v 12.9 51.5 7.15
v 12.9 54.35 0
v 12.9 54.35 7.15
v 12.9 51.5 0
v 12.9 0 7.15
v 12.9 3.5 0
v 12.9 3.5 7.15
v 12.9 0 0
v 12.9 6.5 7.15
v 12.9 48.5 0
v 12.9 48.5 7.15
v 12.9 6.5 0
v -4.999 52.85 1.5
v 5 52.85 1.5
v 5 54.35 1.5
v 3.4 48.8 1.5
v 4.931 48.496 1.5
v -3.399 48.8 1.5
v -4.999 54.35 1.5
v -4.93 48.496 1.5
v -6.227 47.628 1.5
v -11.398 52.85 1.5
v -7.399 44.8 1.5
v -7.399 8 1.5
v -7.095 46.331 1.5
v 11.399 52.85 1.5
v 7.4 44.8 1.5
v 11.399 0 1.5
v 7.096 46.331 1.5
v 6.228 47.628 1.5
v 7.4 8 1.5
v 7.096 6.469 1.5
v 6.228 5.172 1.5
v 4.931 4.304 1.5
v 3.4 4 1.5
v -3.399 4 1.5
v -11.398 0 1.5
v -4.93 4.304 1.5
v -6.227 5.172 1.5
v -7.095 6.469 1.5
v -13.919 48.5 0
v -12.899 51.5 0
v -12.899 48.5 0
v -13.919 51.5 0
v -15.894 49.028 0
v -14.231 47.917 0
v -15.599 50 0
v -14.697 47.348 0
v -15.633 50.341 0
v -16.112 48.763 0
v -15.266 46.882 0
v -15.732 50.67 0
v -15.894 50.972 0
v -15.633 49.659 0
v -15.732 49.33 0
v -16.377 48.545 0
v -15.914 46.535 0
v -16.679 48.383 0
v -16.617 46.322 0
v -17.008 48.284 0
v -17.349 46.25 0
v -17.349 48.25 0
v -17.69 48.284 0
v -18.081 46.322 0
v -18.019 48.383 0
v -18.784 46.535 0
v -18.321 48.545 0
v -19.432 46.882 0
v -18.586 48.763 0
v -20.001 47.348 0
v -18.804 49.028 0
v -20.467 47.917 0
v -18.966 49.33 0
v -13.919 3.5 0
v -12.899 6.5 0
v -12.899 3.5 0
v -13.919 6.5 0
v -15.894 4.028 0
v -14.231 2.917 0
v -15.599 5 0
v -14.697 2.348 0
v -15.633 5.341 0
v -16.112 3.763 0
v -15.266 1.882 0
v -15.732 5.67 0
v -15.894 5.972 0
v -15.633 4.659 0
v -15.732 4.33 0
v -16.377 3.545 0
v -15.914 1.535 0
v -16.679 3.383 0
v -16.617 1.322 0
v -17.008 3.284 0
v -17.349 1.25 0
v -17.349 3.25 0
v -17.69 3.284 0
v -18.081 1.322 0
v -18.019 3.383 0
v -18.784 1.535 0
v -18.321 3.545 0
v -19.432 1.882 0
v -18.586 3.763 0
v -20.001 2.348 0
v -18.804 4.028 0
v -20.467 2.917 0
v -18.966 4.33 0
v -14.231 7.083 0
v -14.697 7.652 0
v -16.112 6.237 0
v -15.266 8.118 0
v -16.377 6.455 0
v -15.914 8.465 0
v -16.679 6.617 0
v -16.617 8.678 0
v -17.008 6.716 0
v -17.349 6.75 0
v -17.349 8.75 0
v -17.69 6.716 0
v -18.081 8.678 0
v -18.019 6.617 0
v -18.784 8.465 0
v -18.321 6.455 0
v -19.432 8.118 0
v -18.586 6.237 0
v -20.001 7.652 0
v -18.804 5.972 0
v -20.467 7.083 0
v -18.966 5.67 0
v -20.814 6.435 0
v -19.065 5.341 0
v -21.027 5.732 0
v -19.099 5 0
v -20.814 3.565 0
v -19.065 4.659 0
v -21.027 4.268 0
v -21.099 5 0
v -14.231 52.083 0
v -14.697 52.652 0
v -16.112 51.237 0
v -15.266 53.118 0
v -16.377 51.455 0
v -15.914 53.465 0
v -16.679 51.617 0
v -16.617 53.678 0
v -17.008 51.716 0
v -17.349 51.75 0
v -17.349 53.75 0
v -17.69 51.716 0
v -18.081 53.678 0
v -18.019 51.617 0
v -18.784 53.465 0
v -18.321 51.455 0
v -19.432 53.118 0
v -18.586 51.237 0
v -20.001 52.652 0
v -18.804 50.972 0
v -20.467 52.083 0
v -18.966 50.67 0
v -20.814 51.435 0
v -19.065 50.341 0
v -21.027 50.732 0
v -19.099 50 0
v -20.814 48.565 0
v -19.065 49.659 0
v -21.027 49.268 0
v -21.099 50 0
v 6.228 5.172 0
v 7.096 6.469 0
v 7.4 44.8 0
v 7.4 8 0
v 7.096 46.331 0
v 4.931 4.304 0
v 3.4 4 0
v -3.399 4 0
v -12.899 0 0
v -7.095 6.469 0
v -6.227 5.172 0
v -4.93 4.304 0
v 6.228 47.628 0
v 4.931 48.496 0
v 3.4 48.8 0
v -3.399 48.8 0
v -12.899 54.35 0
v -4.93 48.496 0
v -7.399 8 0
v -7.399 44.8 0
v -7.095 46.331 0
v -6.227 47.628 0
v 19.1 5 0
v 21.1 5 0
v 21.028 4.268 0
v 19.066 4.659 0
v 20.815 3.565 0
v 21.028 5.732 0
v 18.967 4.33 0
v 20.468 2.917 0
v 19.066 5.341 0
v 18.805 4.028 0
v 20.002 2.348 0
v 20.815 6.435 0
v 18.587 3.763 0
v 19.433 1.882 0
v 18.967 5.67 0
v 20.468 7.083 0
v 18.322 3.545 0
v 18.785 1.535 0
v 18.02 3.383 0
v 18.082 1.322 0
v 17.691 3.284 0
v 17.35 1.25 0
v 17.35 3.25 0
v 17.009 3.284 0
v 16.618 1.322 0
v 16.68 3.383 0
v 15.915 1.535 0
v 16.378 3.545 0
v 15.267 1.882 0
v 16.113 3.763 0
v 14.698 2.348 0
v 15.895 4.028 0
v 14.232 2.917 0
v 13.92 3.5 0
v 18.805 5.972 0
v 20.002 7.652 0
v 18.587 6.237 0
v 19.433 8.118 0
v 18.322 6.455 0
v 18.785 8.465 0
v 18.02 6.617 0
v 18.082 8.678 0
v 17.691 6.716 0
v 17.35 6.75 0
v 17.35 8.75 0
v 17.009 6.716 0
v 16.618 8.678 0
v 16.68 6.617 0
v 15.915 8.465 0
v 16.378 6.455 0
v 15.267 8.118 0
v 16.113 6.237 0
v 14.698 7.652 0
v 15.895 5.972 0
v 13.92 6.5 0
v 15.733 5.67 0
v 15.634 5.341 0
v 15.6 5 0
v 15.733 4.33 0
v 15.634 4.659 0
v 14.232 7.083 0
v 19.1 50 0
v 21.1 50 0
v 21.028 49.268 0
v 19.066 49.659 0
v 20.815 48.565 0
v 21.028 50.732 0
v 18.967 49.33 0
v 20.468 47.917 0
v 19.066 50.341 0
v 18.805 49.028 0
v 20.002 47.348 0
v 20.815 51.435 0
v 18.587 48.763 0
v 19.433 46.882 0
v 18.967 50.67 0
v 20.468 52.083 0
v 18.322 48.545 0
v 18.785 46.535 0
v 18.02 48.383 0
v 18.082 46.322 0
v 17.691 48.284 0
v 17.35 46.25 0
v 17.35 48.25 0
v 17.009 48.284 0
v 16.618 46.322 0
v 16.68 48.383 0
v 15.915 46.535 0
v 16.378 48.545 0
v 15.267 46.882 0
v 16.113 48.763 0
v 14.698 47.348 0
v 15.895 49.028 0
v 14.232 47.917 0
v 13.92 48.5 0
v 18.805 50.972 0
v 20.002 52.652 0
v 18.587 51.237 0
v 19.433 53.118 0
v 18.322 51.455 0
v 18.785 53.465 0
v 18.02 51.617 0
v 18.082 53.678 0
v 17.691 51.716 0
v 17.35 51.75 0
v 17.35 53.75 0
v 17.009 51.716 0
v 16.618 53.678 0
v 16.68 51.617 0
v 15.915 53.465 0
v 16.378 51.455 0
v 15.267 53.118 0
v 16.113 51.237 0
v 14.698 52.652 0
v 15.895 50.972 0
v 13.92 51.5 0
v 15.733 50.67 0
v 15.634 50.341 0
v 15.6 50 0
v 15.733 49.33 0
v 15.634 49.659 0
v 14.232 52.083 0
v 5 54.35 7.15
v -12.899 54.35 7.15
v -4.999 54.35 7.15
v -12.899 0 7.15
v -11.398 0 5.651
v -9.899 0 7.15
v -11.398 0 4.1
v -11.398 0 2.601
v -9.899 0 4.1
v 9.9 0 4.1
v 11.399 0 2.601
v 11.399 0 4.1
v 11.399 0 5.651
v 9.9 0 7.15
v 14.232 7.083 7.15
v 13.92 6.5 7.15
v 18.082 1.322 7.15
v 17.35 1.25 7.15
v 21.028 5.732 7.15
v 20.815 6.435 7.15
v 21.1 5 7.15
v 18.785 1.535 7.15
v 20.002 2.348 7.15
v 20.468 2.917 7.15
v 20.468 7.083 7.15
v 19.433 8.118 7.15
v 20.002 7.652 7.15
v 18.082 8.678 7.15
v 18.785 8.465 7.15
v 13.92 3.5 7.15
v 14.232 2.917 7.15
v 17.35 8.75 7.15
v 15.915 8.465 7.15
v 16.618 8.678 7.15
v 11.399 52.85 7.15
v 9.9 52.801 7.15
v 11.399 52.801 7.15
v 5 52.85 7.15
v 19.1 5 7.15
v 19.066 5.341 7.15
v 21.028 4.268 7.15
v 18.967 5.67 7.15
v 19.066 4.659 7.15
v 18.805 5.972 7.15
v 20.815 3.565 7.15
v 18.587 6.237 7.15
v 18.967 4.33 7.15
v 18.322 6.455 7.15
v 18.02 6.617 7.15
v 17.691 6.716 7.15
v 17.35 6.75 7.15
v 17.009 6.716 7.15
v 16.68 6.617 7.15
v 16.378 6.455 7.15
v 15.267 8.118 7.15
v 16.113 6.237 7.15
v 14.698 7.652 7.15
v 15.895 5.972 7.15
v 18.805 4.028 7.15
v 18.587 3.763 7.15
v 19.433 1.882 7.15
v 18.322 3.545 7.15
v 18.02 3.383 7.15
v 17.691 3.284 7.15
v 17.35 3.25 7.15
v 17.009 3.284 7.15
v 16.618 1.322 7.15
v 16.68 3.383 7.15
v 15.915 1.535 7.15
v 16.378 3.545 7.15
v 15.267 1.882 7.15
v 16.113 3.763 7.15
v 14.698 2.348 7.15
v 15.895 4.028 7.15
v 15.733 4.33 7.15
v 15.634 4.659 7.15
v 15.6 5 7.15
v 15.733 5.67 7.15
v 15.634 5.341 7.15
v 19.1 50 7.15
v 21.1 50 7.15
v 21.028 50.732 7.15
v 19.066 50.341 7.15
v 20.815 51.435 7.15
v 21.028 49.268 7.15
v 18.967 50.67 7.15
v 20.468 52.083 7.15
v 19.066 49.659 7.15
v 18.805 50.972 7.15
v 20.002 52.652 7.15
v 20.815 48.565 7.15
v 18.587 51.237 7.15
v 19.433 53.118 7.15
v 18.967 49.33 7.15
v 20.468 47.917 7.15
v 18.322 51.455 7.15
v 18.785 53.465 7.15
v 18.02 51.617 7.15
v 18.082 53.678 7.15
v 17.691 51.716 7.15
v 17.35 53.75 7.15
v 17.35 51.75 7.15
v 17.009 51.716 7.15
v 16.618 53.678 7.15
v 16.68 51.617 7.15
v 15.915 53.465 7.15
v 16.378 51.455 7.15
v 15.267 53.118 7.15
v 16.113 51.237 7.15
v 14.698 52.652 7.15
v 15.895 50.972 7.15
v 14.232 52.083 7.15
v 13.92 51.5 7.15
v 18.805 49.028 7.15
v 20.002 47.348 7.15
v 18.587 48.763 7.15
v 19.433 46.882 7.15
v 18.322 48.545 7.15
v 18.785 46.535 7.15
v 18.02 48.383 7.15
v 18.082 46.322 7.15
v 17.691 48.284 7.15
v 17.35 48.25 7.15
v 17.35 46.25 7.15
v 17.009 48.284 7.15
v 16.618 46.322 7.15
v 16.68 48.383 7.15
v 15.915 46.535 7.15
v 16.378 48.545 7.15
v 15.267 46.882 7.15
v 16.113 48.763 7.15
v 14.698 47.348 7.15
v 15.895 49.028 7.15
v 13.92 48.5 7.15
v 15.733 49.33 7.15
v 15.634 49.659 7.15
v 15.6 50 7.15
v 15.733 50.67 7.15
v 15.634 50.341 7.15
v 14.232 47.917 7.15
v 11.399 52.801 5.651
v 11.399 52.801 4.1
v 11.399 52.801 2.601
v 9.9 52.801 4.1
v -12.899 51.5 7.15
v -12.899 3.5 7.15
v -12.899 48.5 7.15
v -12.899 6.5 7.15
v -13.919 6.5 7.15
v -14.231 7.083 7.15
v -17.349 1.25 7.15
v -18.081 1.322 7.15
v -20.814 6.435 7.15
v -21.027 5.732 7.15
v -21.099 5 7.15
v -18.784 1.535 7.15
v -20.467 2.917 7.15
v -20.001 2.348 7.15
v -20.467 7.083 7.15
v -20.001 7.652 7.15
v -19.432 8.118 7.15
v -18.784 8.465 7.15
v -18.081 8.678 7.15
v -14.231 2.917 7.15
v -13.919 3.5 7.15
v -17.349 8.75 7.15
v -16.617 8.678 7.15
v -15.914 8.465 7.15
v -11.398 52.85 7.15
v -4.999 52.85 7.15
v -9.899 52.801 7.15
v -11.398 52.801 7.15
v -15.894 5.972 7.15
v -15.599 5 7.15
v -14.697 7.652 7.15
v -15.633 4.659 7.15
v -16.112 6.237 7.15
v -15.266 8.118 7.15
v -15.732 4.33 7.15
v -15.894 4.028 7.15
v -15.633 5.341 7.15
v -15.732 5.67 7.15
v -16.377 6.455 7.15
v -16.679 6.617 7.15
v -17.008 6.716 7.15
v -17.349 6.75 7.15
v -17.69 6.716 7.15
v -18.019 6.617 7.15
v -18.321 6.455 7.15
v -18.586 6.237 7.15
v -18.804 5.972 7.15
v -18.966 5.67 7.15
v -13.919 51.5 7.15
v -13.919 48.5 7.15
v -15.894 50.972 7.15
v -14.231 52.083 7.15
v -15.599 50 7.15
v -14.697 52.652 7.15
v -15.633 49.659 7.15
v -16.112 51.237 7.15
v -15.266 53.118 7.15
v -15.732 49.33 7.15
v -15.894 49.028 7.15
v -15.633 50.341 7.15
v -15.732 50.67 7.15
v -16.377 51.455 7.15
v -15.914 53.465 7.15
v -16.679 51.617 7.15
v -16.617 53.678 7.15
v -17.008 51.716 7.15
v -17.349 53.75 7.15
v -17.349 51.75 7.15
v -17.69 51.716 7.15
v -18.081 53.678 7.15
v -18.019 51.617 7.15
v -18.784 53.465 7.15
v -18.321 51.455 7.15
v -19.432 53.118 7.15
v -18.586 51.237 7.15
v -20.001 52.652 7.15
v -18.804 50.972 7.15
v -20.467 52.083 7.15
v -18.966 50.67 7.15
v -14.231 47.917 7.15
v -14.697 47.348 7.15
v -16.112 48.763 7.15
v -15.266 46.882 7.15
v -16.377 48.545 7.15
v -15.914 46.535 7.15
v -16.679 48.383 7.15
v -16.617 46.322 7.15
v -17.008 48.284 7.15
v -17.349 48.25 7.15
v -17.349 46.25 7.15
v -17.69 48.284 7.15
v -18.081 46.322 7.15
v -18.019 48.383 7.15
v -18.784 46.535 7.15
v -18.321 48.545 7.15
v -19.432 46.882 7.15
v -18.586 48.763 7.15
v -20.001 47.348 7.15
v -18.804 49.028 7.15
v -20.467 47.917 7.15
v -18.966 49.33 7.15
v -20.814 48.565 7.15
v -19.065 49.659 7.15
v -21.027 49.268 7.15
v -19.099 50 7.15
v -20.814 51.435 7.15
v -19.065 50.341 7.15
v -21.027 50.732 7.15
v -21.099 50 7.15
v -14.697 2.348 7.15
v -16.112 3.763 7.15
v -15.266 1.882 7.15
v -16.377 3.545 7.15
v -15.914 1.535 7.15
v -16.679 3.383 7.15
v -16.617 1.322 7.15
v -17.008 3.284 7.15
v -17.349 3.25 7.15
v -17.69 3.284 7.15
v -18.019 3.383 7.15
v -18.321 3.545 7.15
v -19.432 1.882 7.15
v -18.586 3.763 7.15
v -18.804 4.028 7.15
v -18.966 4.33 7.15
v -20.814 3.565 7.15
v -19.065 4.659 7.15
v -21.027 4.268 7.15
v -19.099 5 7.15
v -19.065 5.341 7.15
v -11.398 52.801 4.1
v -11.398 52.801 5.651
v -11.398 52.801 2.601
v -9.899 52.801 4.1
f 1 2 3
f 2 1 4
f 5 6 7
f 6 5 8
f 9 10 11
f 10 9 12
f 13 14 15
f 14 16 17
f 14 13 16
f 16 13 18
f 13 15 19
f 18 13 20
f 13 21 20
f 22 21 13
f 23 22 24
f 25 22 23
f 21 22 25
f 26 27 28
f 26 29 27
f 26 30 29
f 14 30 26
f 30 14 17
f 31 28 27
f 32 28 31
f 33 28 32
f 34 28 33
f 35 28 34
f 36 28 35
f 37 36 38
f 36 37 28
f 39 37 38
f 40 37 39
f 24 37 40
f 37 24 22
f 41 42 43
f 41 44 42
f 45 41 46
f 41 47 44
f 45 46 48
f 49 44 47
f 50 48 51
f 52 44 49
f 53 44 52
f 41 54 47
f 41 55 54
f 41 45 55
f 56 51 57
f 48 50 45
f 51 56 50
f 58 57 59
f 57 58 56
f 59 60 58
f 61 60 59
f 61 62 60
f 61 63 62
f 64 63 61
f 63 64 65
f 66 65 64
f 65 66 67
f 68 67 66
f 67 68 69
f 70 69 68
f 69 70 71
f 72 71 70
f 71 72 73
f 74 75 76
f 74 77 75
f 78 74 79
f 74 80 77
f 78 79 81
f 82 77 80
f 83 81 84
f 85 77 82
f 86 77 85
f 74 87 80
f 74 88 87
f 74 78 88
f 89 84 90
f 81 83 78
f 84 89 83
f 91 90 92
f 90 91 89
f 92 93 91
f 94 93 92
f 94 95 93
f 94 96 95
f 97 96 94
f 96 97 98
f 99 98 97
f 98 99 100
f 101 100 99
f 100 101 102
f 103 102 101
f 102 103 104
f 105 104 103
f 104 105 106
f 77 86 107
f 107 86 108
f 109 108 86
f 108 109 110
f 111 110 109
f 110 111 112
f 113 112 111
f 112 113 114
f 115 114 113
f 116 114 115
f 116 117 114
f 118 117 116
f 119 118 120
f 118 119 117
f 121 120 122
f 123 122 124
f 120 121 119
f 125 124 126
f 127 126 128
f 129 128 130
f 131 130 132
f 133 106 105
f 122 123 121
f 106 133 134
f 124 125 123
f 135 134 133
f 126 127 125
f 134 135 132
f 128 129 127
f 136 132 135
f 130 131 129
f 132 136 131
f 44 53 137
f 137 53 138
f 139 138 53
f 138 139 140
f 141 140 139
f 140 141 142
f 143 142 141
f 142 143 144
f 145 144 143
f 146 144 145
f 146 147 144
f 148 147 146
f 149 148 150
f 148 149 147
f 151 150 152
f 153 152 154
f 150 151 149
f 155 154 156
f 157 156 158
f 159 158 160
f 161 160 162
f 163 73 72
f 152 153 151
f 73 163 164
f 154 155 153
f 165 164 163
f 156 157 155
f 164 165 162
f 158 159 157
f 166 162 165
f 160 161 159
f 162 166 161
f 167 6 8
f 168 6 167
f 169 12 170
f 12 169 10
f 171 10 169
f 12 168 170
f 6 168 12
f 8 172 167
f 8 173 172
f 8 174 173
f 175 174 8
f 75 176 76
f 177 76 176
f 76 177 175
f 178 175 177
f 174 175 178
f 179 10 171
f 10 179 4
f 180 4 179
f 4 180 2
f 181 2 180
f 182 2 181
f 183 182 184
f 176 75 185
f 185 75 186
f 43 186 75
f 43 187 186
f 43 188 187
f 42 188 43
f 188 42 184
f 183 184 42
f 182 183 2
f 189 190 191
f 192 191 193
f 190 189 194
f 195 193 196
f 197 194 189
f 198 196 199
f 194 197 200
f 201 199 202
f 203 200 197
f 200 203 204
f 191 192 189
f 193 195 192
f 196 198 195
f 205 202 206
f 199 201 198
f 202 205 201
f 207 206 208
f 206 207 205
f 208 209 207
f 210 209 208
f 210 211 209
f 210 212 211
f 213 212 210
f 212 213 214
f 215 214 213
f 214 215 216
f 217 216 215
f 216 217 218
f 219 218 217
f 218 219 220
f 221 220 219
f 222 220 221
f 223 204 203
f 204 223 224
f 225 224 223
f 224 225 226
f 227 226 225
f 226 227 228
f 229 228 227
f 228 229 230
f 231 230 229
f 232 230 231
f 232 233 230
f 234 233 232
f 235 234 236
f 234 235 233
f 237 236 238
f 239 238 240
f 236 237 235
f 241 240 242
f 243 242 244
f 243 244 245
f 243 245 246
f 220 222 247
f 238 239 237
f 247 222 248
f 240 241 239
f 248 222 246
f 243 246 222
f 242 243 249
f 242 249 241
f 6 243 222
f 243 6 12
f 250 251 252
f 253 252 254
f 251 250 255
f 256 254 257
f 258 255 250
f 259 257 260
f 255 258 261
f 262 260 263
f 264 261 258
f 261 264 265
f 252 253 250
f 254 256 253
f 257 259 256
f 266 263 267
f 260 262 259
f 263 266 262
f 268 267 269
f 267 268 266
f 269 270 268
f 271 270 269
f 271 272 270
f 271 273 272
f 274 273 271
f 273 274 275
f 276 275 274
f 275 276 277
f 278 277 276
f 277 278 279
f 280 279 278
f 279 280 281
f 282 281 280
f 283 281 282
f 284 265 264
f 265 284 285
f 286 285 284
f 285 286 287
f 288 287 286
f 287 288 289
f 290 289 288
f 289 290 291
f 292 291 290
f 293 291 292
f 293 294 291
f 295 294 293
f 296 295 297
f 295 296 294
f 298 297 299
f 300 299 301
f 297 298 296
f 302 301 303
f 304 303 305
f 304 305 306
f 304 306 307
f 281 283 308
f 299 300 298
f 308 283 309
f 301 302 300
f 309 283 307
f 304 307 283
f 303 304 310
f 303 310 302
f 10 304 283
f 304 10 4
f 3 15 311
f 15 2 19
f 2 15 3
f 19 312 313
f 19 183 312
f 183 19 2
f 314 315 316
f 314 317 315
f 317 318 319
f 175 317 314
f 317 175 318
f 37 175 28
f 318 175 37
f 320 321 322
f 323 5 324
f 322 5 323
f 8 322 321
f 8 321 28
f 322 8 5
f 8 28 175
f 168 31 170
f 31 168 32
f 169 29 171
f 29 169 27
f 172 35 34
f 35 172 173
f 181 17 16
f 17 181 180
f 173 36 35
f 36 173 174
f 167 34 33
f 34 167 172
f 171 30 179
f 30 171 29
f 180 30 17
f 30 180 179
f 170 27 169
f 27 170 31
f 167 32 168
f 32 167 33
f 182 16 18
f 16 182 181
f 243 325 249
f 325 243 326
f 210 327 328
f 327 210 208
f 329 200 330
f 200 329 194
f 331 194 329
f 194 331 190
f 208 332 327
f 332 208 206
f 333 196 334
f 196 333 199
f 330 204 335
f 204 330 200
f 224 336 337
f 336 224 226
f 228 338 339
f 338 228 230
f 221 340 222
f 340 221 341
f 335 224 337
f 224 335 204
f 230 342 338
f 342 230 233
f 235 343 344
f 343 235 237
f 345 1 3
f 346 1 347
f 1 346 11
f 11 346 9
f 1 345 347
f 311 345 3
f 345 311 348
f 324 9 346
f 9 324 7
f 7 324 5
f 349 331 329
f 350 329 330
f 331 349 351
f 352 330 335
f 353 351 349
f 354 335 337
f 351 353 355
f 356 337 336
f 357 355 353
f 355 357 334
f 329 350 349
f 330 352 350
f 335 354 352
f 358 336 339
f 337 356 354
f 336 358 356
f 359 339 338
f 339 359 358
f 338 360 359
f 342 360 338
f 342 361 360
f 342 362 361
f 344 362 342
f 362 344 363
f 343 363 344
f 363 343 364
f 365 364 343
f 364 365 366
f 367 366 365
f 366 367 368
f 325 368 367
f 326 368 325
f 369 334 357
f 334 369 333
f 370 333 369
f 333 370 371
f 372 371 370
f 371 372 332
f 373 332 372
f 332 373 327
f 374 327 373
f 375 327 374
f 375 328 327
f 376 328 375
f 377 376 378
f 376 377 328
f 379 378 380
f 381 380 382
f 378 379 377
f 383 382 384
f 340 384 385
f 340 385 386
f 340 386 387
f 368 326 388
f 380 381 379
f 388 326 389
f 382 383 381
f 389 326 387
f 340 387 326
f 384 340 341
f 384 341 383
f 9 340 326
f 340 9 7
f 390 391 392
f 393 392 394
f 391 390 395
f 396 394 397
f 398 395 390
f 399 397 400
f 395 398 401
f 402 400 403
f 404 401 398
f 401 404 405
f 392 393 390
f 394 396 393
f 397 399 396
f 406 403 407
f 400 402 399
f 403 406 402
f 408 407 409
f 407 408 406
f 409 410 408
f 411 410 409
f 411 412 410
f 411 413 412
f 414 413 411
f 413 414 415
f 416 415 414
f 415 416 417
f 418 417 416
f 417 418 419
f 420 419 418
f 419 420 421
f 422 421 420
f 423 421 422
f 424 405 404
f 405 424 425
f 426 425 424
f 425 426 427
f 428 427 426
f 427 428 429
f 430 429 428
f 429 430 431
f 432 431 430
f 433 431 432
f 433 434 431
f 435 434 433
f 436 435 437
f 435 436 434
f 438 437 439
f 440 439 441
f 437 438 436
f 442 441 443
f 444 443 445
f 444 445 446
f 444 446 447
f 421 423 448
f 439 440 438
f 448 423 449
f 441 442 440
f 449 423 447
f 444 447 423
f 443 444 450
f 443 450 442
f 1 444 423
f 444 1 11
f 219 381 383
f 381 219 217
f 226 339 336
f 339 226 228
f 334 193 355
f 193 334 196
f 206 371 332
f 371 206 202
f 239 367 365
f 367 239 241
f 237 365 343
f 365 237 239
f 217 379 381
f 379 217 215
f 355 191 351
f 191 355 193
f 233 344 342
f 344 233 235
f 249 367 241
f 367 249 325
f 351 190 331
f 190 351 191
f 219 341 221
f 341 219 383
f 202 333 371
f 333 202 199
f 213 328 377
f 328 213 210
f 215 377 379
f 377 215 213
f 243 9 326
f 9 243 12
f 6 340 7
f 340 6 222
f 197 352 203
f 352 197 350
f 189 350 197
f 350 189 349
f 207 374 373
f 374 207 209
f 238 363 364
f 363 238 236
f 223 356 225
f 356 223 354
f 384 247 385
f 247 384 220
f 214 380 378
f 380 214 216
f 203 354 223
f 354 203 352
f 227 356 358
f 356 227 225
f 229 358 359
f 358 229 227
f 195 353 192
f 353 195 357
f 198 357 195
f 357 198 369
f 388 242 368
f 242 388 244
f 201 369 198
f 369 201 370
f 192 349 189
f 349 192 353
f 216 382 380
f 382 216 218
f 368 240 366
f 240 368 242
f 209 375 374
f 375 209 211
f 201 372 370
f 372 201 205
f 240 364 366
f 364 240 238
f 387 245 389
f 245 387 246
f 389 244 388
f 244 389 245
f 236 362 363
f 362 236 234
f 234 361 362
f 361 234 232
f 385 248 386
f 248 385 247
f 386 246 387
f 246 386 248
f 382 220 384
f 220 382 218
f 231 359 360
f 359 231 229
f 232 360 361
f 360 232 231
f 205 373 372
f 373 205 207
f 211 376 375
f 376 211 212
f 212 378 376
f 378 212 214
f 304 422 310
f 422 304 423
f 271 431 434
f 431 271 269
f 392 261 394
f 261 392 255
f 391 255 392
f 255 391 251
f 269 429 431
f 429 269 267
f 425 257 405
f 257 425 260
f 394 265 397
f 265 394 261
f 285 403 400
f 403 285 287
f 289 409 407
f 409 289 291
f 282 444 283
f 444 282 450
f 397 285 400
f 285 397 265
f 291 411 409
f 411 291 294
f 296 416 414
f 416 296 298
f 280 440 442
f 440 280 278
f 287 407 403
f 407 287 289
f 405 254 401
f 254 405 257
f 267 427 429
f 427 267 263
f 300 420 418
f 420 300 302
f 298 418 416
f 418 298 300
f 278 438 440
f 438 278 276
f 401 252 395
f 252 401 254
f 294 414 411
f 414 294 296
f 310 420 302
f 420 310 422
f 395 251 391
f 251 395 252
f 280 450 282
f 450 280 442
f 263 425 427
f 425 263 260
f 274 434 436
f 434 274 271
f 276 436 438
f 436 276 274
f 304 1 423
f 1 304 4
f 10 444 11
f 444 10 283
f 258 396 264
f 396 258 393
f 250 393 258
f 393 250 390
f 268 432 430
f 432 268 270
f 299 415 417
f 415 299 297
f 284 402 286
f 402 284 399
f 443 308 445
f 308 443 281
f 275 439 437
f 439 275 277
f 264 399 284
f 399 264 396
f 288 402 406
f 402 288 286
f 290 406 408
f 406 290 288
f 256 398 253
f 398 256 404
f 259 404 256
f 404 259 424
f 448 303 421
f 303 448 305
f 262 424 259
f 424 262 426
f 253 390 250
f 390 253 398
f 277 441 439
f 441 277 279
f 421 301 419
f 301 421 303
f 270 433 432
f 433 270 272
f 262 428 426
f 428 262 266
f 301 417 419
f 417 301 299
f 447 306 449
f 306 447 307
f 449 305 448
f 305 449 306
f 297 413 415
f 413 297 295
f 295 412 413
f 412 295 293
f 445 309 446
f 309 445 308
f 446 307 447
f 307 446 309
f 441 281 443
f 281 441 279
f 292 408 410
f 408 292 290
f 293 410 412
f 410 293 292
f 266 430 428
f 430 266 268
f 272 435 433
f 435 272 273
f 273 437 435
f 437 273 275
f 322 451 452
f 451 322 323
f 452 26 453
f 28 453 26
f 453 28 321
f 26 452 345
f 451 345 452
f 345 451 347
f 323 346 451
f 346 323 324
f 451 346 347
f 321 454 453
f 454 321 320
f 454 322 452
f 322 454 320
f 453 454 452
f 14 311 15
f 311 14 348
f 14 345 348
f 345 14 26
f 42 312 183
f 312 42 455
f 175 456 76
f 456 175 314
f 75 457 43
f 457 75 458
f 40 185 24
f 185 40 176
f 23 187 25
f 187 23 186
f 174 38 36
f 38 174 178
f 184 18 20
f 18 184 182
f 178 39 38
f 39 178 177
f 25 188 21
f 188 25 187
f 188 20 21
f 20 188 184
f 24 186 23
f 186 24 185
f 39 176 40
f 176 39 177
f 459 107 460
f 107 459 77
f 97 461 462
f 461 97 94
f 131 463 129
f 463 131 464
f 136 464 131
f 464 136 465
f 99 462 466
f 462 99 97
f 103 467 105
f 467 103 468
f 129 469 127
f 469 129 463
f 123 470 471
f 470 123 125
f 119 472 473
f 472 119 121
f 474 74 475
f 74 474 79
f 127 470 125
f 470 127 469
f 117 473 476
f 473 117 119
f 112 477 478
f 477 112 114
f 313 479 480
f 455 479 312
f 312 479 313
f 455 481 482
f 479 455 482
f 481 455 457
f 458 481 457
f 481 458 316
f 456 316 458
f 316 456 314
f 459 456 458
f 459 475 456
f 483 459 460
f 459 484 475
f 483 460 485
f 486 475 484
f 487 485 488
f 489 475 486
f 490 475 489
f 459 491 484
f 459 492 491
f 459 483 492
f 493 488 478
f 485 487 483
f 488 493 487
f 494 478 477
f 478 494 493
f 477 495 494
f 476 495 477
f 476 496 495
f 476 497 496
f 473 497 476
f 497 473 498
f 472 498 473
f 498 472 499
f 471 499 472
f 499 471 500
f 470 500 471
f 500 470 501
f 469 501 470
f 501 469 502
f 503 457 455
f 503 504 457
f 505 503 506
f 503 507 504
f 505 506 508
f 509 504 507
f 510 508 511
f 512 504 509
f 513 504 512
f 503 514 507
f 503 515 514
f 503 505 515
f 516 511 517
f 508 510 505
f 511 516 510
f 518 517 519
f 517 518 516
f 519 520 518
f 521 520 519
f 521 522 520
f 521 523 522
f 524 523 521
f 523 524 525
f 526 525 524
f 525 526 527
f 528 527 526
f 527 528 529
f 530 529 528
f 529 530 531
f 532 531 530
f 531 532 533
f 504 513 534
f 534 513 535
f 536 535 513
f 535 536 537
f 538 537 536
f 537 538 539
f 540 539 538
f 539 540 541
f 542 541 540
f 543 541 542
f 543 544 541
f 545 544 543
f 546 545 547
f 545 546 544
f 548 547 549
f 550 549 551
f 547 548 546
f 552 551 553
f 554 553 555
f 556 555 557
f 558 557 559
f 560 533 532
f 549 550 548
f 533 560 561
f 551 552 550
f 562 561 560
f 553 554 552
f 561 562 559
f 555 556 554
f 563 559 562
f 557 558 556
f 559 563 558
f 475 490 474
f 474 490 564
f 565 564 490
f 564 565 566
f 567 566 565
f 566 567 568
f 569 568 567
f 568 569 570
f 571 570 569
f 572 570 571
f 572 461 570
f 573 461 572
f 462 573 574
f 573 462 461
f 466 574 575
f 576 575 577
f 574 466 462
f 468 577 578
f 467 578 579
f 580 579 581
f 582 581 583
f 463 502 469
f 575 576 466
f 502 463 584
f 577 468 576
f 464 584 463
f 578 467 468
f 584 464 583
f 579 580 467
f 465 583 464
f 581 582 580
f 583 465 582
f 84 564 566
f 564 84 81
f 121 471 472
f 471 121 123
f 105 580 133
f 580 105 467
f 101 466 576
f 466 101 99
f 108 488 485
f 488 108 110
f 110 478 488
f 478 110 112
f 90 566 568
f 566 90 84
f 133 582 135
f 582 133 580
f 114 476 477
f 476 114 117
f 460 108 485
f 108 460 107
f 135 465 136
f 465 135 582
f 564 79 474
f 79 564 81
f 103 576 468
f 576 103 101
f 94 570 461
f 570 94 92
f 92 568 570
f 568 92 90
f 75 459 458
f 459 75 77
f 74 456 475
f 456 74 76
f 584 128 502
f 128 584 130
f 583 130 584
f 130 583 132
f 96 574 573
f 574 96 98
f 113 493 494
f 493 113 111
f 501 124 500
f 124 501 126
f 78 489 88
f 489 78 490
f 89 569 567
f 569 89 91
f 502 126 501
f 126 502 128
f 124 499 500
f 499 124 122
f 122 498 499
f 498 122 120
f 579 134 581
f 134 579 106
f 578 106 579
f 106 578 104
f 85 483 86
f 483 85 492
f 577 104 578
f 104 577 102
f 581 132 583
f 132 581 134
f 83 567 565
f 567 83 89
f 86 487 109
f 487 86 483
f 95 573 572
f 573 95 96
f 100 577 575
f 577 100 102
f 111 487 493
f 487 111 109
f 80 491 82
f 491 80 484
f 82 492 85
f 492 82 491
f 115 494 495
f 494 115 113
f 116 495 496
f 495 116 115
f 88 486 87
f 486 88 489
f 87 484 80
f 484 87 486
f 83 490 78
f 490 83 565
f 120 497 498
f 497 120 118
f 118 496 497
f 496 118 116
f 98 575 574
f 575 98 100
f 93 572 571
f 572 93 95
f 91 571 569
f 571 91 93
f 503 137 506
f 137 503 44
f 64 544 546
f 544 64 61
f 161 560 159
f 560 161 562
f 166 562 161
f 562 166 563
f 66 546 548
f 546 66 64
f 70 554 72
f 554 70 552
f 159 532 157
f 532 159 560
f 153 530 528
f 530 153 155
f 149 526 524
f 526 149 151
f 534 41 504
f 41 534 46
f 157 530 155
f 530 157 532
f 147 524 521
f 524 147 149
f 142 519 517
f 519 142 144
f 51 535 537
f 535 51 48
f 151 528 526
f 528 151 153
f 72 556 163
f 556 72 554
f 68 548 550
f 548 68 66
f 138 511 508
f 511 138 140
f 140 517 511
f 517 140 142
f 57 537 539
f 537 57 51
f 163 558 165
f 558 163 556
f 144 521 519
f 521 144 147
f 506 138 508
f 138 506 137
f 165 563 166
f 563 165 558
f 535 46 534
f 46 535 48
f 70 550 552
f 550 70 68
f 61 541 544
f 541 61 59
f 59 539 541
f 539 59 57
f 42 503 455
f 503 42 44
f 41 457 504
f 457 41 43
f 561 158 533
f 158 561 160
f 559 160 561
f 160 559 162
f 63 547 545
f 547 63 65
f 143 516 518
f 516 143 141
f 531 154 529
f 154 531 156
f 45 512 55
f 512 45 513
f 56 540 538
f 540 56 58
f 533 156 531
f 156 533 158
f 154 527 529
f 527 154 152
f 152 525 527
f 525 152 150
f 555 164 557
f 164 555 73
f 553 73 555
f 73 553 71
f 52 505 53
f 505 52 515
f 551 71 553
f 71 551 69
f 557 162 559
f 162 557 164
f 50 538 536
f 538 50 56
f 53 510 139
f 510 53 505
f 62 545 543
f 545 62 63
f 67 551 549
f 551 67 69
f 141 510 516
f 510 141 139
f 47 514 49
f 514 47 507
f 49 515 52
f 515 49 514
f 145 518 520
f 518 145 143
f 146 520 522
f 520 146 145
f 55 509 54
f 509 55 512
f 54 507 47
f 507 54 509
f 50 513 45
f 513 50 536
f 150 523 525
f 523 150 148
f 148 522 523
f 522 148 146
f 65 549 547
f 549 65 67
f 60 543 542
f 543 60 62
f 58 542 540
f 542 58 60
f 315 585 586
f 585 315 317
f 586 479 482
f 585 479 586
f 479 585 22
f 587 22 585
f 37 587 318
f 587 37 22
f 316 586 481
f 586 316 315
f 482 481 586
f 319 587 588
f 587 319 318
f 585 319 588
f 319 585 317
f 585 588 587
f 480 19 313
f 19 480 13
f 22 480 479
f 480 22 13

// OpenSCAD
//BEGIN: use <pointhull.scad>;
function _slice(list,start,end=undef) =
    let(end = end==undef?len(list):end)
    [for(i=[start:1:end-1]) list[i]];

function _delete(list,pos) =
    let(l=len(list))
    pos == 0 ? [for(i=[1:1:l-1]) list[i]] :
    pos >= l-1 ? [for(i=[0:1:pos-1]) list[i]] :
    concat([for(i=[0:1:pos-1]) list[i]],
        [for(i=[pos+1:1:l-1]) list[i]]);

function _areCollinear(a,b,c) = cross(b-a,c-a) == [0,0,0];

function _areCoplanar(a,b,c,d) = (d-a)*cross(b-a,c-a) == 0;

function _findNoncollinear(list,point1,point2,pos=0) =
    pos >= len(list) ? undef :
    ! _areCollinear(point1,point2,list[pos]) ? pos :
    _findNoncollinear(list,point1,point2,pos=pos+1);

function _findNoncoplanar(list,point1,point2,point3,pos=0) =
   pos >= len(list) ? undef :
   ! _areCoplanar(point1,point2,point3,list[pos]) ? pos :
        _findNoncoplanar(list,point1,point2,point3,pos=pos+1);

function _isBoundedBy(a,face,strict=false) =
    cross(face[1]-face[0],face[2]-face[0])*(a-face[0]);

function _makeTet(a,b,c,d) =
    _isBoundedBy(d,[a,b,c]) >= 0 ?
        [[a,b,c],[b,a,d],[c,b,d],[a,c,d]] :
        [[c,b,a],[d,a,b],[d,b,c],[d,c,a]];

function _findTri(list) =
    let(l2=_unique(list))
    assert(len(l2)>=3)
    let(a=l2[0],
        b=l2[1],
        l3=_slice(l2,2),
        ci=_findNoncollinear(l3,a,b),
        c=assert(ci != undef) l3[ci],
        l4=_delete(l3,ci))
        [[a,b,c],l4];

function _findTet(list) =
    let(ft=_findTri(list),
        tri=ft[0],
        l4=ft[1],
        di=assert(len(l4)>0) _findNoncoplanar(l4,tri[0],tri[1],tri[2]),
        d=assert(di != undef) l4[di],
        l5=_delete(l4,di))
        [_makeTet(tri[0],tri[1],tri[2],d),l5];

function _find(list,value) =
    let(m=search([value],list,1)[0])
    m==[] ? undef : m;

function _unique(list,soFar=[],pos=0) =
    pos >= len(list) ? soFar :
    _find(soFar,list[pos]) == undef ? _unique(list,soFar=concat(soFar,[list[pos]]),pos=pos+1) :
    _unique(list,soFar=soFar,pos=pos+1);

function _makePointsAndFaces(triangles) =
    let(points=_unique([for(t=triangles) for(v=t) v]))
        [points, [for(t=triangles) [for(v=t) _find(points,v)]]];

function _sameSide(p1,p2, a,b) =
    let(cp1 = cross(b-a, p1-a),
        cp2 = cross(b-a, p2-a))
        cp1*cp2 >= 0;

function _insideTriangle(p, t) =
    _sameSide(p,t[0],t[1],t[2]) &&
    _sameSide(p,t[1],t[0],t[2]) &&
    _sameSide(p,t[2],t[0],t[1]);


function _satisfiesConstraint(p, triangle) =
    let(c=_isBoundedBy(p, triangle))
    c > 0 || (c == 0 && _insideTriangle(p, triangle));


function _insidePoly(p, triangles, pos=0) =
    pos >= len(triangles) ? true :
    !_satisfiesConstraint(p, triangles[pos]) ? false :
    _insidePoly(p, triangles, pos=pos+1);

function _outerEdges(triangles) =
        let(edges=[for(t=triangles) for(e=[[t[0],t[1]],
                [t[1],t[2]],
                [t[2],t[0]]]) e])
        [for(e=edges) if(undef == _find(edges,[e[1],e[0]])) e];

function _unlit(triangles, p) = [for(t=triangles) if(_isBoundedBy(p, t) >= 0) t];

function _addToHull(h, p) =
    let(unlit = _unlit(h,p),
        edges = _outerEdges(unlit))
        concat(unlit, [for(e=edges) [e[1],e[0],p]]);

function _expandHull(h, points, pos=0) =
    pos >= len(points) ? h :
    !_insidePoly(points[pos],h) ?  _expandHull(_addToHull(h,points[pos]),points,pos=pos+1) :
    _expandHull(h, points, pos=pos+1);

function pointHull3D(points) =
    let(ft=_findTet(points))
        _expandHull(ft[0], ft[1]);

function _traceEdges(edgeStarts,edgeEnds,soFar=undef) =
    soFar==undef ? _traceEdges(edgeStarts,edgeEnds,[edgeStarts[0]]) :
    assert(soFar[len(soFar)-1] != undef)
    len(soFar)>1 && soFar[len(soFar)-1] == soFar[0] ? _slice(soFar,1) :
    _traceEdges(edgeStarts,edgeEnds,soFar=concat(soFar,[edgeEnds[_find(edgeStarts,soFar[len(soFar)-1])]]));

function _project(v) = [v[0],v[1]];

function pointHull2D(points) =
    let(
        p3d = concat([[0,0,1]],
            [for(p=points) [p[0],p[1],0]]),
        h = pointHull3D(p3d),
        edgeStarts = [for(t=h) if(t[0][2]==1 || t[1][2]==1 || t[2][2]==1)
                t[0][2]==1 ? _project(t[1]) :
                t[1][2]==1 ? _project(t[2]) :
                _project(t[0]) ],
        edgeEnds = [for(t=h) if(t[0][2]==1 || t[1][2]==1 || t[2][2]==1)
                t[0][2]==1 ? _project(t[2]) :
                t[1][2]==1 ? _project(t[0]) :
                _project(t[1]) ])
        _traceEdges(edgeStarts,edgeEnds,soFar=[edgeStarts[0]]);

function pointHull(points) =
    len(points[0]) == 2 ? pointHull2D(points) :
        pointHull3D(points);

module pointHull(points) {
    if (len(points[0])==2) {
        polygon(pointHull2D(points));
    }
    else {
        paf = _makePointsAndFaces(pointHull3D(points));
        polyhedron(points=paf[0],faces=paf[1]);
    }
}

function extractPointsFromHull(h) =
    _unique(
        is_num(h[0][0]) ? h : [for(t=h) for(v=t) v] );

function _d22(a00,a01,a10,a11) = a00*a11-a01*a10;

function _determinant3x3(m) = m[0][0]*_d22(m[1][1],m[1][2],m[2][1],m[2][2])
    -m[0][1]*_d22(m[1][0],m[1][2],m[2][0],m[2][2])
    +m[0][2]*_d22(m[1][0],m[1][1],m[2][0],m[2][1]);

function _determinant2x2(m) = _d22(m[0][0],m[0][1],m[1][0],m[1][1]);

// Cramer's rule
// n.b. Determinant of matrix is the same as of its transpose
function _solve3(a,b,c) =
    let(det=_determinant3x3([a[0],b[0],c[0]]))
    det == 0 ? undef :
    let(rhs=[a[1],b[1],c[1]],
        col0=[a[0][0],b[0][0],c[0][0]],
        col1=[a[0][1],b[0][1],c[0][1]],
        col2=[a[0][2],b[0][2],c[0][2]])
    [_determinant3x3([rhs,col1,col2]),
    _determinant3x3([col0,rhs,col2]),
    _determinant3x3([col0,col1,rhs])]/det;

function _solve2(a,b) =
    let(det=_determinant2x2([a[0],b[0]]))
    det == 0 ? undef :
    let(rhs=[a[1],b[1]],
        col0=[a[0][0],b[0][0]],
        col1=[a[0][1],b[0][1]])
    [_determinant2x2([rhs,col1]),
    _determinant2x2([col0,rhs])]/det;

function _satisfies(p,constraint) =
    p*constraint[0] <= constraint[1];

function _linearConstraintExtrema(constraints,constraintsMarked=false) =
        let(c=_unique(constraints),
            n=len(c))
        len(c[0][0]) == 3 ?
        [
        for(i=[0:1:n-1]) for(j=[i+1:1:n-1]) for(k=[j+1:1:n-1]) let(p=_solve3(c[i],c[j],c[k])) if(p!=undef && _satisfiesAll(p,c,except1=i,except2=j,except3=k)) constraintsMarked?[p,[i,j,k]]:p
        ] :
        [
        for(i=[0:1:n-1]) for(j=[i+1:1:n-1]) let(p=_solve2(c[i],c[j])) if(p!=undef && _satisfiesAll(p,c,except1=i,except2=j)) constraintsMarked?[p,[i,j,-1]]:p
        ];

function _satisfiesAll(p,c,except1=undef,except2=undef,except3=undef,pos=0) =
        pos >= len(c) ? true :
        except1 == pos || except2 == pos || except3 == pos || _satisfies(p,c[pos]) ? _satisfiesAll(p,c,except1,except2,except3,pos=pos+1) :
        false;


module linearConstraintShape(constraints) {
    pointHull(_linearConstraintExtrema(constraints));
}

// 3D inly
function _onPlane(v,planeIndex,data,pos=0) =
    pos >= len(data) ? false :
    data[pos][0] == v && (data[pos][1][0] == planeIndex || data[pos][1][1] == planeIndex || data[pos][1][2] == planeIndex) ? true :
    _onPlane(v,planeIndex,data,pos=pos+1);

// 3D only
function _getFaceOnPlane(planeIndex,triangles,data) =
    let(trianglesOnPlane = [for(t=triangles) if (_onPlane(t[0],planeIndex,data) &&
        _onPlane(t[1],planeIndex,data) &&
        _onPlane(t[2],planeIndex,data)) t],
        outer = _outerEdges(trianglesOnPlane),
        edgeStarts = [for(e=outer) e[0]],
        edgeEnds = [for(e=outer) e[1]]
    ) len(outer) == 0 ? undef : echo("se",edgeStarts,edgeEnds) _traceEdges(edgeStarts,edgeEnds);

// 3D only, does not work if there are multiple planes defined by the same constraint
function linearConstraintPointsAndFaces(constraints) =
    let(data=_linearConstraintExtrema(constraints,constraintsMarked=true),
    extremePoints=[for(d=data) d[0]],

    triangles=pointHull(extremePoints),
    hullPoints=extractPointsFromHull(triangles),
    faces=[for (i=[0:len(constraints)-1]) [for(v=_getFaceOnPlane(i,triangles,data)) if(v != undef) _find(hullPoints,v)]]
    )
    [hullPoints,faces];

function hullPoints(points) =
    extractPointsFromHull(pointHull(points));

module dualHull(points) {
    p = hullPoints(points);
    constraints = [for(v=p) [v,v*v]];
    linearConstraintShape(constraints);
}


//END: use <pointhull.scad>;


//BEGIN: use <roundedSquare.scad>;
module roundedSquare(size=[10,10], radius=1, center=false, $fn=16) {
    size1 = (size+0==size) ? [size,size] : size;
    if (radius <= 0) {
        square(size1, center=center);
    }
    else {
        translate(center ? -size1/2 : [0,0])
        hull() {
            translate([radius,radius]) circle(r=radius);
            translate([size1[0]-radius,radius]) circle(r=radius);
            translate([size1[0]-radius,size1[1]-radius]) circle(r=radius);
            translate([radius,size1[1]-radius]) circle(r=radius);
        }
    }
}

module roundedCube(size=[10,10,10], radius=1, center=false, $fn=16) {
    linear_extrude(height=size[2])
    roundedSquare(size=[size[0],size[1]], radius=radius, center=center);
}

module roundedOpenTopBox(size=[10,10,10], radius=2, wall=1, solid=false) {
    render(convexity=2)
    difference() {
        linear_extrude(height=size[2]) roundedSquare(size=[size[0],size[1]], radius=radius);
        if (!solid) {
            translate([0,0,wall])
            linear_extrude(height=size[2]-wall)
            translate([wall,wall]) roundedSquare(size=[size[0]-2*wall,size[1]-2*wall], radius=radius-wall);
        }
    }
}

//END: use <roundedSquare.scad>;


// <params>
pcbThickness = 1.55;
pcbWidth = 22.7;
pcbLength = 52.8;
pcbOffsetFromBase = 2.6;
tolerance = 0.05;
wall = 1.5;
ridge = 1.5;
screwSize = 3.5;
screwHoleWall = 2;
screwButtressWall = 3;
screw1DistanceFromFront = 5;
screw2DistanceFromFront = 50;
screwDistanceFromPCB = 6;
rearHole = 10;
holeDistanceFromWall = 4;
// </params>

module dummy() {}

$fn = 32;

nudge = 0.001;

h = wall+pcbOffsetFromBase+pcbThickness+ridge;

echo("height", h);
echo("screwSpacing", screwDistanceFromPCB*2 + pcbWidth);

module screw() {
    d = screwSize + screwHoleWall*2;
    translate([screwDistanceFromPCB+pcbWidth/2,0,0]) {
        difference() {
            union() {
            cylinder(d=d, h=h);
            translate([-screwDistanceFromPCB+tolerance,-screwButtressWall/2,0]) cube([screwDistanceFromPCB-tolerance,screwButtressWall,h]);
            }
            translate([0,0,-h]) cylinder(d=screwSize,h=3*h);
        }
    }
}

module half() {
    x = pcbWidth/2+tolerance;
    difference() {
    cube ([x+wall,pcbLength+wall+tolerance,wall]);
    translate([0,0,-wall])
    linear_extrude(height=wall*3)
    translate([-(x-holeDistanceFromWall),holeDistanceFromWall,0])
    roundedSquare([2*x-2*holeDistanceFromWall,pcbLength-2*holeDistanceFromWall],radius=holeDistanceFromWall);
    }
    translate([x-nudge,0,0]) cube([wall+nudge,pcbLength+wall+tolerance,h]);
    module vridge(h) {
    pointHull([[x,0,h-ridge],
        [x,0,h],[x-ridge,0,h],
        [x,pcbLength+nudge,h-ridge],
        [x,pcbLength+nudge,h],[x-ridge,pcbLength+nudge,h]]);
    }
    vridge(h);
    vridge(h-ridge-pcbThickness);
    translate([rearHole/2,pcbLength+tolerance,0])
    cube([x+wall-rearHole/2,wall,h]);
    translate([0,screw1DistanceFromFront,0])
    screw();
    translate([0,screw2DistanceFromFront,0])
    screw();
}

half();
translate([nudge,0,0]) mirror([1,0,0]) half();
